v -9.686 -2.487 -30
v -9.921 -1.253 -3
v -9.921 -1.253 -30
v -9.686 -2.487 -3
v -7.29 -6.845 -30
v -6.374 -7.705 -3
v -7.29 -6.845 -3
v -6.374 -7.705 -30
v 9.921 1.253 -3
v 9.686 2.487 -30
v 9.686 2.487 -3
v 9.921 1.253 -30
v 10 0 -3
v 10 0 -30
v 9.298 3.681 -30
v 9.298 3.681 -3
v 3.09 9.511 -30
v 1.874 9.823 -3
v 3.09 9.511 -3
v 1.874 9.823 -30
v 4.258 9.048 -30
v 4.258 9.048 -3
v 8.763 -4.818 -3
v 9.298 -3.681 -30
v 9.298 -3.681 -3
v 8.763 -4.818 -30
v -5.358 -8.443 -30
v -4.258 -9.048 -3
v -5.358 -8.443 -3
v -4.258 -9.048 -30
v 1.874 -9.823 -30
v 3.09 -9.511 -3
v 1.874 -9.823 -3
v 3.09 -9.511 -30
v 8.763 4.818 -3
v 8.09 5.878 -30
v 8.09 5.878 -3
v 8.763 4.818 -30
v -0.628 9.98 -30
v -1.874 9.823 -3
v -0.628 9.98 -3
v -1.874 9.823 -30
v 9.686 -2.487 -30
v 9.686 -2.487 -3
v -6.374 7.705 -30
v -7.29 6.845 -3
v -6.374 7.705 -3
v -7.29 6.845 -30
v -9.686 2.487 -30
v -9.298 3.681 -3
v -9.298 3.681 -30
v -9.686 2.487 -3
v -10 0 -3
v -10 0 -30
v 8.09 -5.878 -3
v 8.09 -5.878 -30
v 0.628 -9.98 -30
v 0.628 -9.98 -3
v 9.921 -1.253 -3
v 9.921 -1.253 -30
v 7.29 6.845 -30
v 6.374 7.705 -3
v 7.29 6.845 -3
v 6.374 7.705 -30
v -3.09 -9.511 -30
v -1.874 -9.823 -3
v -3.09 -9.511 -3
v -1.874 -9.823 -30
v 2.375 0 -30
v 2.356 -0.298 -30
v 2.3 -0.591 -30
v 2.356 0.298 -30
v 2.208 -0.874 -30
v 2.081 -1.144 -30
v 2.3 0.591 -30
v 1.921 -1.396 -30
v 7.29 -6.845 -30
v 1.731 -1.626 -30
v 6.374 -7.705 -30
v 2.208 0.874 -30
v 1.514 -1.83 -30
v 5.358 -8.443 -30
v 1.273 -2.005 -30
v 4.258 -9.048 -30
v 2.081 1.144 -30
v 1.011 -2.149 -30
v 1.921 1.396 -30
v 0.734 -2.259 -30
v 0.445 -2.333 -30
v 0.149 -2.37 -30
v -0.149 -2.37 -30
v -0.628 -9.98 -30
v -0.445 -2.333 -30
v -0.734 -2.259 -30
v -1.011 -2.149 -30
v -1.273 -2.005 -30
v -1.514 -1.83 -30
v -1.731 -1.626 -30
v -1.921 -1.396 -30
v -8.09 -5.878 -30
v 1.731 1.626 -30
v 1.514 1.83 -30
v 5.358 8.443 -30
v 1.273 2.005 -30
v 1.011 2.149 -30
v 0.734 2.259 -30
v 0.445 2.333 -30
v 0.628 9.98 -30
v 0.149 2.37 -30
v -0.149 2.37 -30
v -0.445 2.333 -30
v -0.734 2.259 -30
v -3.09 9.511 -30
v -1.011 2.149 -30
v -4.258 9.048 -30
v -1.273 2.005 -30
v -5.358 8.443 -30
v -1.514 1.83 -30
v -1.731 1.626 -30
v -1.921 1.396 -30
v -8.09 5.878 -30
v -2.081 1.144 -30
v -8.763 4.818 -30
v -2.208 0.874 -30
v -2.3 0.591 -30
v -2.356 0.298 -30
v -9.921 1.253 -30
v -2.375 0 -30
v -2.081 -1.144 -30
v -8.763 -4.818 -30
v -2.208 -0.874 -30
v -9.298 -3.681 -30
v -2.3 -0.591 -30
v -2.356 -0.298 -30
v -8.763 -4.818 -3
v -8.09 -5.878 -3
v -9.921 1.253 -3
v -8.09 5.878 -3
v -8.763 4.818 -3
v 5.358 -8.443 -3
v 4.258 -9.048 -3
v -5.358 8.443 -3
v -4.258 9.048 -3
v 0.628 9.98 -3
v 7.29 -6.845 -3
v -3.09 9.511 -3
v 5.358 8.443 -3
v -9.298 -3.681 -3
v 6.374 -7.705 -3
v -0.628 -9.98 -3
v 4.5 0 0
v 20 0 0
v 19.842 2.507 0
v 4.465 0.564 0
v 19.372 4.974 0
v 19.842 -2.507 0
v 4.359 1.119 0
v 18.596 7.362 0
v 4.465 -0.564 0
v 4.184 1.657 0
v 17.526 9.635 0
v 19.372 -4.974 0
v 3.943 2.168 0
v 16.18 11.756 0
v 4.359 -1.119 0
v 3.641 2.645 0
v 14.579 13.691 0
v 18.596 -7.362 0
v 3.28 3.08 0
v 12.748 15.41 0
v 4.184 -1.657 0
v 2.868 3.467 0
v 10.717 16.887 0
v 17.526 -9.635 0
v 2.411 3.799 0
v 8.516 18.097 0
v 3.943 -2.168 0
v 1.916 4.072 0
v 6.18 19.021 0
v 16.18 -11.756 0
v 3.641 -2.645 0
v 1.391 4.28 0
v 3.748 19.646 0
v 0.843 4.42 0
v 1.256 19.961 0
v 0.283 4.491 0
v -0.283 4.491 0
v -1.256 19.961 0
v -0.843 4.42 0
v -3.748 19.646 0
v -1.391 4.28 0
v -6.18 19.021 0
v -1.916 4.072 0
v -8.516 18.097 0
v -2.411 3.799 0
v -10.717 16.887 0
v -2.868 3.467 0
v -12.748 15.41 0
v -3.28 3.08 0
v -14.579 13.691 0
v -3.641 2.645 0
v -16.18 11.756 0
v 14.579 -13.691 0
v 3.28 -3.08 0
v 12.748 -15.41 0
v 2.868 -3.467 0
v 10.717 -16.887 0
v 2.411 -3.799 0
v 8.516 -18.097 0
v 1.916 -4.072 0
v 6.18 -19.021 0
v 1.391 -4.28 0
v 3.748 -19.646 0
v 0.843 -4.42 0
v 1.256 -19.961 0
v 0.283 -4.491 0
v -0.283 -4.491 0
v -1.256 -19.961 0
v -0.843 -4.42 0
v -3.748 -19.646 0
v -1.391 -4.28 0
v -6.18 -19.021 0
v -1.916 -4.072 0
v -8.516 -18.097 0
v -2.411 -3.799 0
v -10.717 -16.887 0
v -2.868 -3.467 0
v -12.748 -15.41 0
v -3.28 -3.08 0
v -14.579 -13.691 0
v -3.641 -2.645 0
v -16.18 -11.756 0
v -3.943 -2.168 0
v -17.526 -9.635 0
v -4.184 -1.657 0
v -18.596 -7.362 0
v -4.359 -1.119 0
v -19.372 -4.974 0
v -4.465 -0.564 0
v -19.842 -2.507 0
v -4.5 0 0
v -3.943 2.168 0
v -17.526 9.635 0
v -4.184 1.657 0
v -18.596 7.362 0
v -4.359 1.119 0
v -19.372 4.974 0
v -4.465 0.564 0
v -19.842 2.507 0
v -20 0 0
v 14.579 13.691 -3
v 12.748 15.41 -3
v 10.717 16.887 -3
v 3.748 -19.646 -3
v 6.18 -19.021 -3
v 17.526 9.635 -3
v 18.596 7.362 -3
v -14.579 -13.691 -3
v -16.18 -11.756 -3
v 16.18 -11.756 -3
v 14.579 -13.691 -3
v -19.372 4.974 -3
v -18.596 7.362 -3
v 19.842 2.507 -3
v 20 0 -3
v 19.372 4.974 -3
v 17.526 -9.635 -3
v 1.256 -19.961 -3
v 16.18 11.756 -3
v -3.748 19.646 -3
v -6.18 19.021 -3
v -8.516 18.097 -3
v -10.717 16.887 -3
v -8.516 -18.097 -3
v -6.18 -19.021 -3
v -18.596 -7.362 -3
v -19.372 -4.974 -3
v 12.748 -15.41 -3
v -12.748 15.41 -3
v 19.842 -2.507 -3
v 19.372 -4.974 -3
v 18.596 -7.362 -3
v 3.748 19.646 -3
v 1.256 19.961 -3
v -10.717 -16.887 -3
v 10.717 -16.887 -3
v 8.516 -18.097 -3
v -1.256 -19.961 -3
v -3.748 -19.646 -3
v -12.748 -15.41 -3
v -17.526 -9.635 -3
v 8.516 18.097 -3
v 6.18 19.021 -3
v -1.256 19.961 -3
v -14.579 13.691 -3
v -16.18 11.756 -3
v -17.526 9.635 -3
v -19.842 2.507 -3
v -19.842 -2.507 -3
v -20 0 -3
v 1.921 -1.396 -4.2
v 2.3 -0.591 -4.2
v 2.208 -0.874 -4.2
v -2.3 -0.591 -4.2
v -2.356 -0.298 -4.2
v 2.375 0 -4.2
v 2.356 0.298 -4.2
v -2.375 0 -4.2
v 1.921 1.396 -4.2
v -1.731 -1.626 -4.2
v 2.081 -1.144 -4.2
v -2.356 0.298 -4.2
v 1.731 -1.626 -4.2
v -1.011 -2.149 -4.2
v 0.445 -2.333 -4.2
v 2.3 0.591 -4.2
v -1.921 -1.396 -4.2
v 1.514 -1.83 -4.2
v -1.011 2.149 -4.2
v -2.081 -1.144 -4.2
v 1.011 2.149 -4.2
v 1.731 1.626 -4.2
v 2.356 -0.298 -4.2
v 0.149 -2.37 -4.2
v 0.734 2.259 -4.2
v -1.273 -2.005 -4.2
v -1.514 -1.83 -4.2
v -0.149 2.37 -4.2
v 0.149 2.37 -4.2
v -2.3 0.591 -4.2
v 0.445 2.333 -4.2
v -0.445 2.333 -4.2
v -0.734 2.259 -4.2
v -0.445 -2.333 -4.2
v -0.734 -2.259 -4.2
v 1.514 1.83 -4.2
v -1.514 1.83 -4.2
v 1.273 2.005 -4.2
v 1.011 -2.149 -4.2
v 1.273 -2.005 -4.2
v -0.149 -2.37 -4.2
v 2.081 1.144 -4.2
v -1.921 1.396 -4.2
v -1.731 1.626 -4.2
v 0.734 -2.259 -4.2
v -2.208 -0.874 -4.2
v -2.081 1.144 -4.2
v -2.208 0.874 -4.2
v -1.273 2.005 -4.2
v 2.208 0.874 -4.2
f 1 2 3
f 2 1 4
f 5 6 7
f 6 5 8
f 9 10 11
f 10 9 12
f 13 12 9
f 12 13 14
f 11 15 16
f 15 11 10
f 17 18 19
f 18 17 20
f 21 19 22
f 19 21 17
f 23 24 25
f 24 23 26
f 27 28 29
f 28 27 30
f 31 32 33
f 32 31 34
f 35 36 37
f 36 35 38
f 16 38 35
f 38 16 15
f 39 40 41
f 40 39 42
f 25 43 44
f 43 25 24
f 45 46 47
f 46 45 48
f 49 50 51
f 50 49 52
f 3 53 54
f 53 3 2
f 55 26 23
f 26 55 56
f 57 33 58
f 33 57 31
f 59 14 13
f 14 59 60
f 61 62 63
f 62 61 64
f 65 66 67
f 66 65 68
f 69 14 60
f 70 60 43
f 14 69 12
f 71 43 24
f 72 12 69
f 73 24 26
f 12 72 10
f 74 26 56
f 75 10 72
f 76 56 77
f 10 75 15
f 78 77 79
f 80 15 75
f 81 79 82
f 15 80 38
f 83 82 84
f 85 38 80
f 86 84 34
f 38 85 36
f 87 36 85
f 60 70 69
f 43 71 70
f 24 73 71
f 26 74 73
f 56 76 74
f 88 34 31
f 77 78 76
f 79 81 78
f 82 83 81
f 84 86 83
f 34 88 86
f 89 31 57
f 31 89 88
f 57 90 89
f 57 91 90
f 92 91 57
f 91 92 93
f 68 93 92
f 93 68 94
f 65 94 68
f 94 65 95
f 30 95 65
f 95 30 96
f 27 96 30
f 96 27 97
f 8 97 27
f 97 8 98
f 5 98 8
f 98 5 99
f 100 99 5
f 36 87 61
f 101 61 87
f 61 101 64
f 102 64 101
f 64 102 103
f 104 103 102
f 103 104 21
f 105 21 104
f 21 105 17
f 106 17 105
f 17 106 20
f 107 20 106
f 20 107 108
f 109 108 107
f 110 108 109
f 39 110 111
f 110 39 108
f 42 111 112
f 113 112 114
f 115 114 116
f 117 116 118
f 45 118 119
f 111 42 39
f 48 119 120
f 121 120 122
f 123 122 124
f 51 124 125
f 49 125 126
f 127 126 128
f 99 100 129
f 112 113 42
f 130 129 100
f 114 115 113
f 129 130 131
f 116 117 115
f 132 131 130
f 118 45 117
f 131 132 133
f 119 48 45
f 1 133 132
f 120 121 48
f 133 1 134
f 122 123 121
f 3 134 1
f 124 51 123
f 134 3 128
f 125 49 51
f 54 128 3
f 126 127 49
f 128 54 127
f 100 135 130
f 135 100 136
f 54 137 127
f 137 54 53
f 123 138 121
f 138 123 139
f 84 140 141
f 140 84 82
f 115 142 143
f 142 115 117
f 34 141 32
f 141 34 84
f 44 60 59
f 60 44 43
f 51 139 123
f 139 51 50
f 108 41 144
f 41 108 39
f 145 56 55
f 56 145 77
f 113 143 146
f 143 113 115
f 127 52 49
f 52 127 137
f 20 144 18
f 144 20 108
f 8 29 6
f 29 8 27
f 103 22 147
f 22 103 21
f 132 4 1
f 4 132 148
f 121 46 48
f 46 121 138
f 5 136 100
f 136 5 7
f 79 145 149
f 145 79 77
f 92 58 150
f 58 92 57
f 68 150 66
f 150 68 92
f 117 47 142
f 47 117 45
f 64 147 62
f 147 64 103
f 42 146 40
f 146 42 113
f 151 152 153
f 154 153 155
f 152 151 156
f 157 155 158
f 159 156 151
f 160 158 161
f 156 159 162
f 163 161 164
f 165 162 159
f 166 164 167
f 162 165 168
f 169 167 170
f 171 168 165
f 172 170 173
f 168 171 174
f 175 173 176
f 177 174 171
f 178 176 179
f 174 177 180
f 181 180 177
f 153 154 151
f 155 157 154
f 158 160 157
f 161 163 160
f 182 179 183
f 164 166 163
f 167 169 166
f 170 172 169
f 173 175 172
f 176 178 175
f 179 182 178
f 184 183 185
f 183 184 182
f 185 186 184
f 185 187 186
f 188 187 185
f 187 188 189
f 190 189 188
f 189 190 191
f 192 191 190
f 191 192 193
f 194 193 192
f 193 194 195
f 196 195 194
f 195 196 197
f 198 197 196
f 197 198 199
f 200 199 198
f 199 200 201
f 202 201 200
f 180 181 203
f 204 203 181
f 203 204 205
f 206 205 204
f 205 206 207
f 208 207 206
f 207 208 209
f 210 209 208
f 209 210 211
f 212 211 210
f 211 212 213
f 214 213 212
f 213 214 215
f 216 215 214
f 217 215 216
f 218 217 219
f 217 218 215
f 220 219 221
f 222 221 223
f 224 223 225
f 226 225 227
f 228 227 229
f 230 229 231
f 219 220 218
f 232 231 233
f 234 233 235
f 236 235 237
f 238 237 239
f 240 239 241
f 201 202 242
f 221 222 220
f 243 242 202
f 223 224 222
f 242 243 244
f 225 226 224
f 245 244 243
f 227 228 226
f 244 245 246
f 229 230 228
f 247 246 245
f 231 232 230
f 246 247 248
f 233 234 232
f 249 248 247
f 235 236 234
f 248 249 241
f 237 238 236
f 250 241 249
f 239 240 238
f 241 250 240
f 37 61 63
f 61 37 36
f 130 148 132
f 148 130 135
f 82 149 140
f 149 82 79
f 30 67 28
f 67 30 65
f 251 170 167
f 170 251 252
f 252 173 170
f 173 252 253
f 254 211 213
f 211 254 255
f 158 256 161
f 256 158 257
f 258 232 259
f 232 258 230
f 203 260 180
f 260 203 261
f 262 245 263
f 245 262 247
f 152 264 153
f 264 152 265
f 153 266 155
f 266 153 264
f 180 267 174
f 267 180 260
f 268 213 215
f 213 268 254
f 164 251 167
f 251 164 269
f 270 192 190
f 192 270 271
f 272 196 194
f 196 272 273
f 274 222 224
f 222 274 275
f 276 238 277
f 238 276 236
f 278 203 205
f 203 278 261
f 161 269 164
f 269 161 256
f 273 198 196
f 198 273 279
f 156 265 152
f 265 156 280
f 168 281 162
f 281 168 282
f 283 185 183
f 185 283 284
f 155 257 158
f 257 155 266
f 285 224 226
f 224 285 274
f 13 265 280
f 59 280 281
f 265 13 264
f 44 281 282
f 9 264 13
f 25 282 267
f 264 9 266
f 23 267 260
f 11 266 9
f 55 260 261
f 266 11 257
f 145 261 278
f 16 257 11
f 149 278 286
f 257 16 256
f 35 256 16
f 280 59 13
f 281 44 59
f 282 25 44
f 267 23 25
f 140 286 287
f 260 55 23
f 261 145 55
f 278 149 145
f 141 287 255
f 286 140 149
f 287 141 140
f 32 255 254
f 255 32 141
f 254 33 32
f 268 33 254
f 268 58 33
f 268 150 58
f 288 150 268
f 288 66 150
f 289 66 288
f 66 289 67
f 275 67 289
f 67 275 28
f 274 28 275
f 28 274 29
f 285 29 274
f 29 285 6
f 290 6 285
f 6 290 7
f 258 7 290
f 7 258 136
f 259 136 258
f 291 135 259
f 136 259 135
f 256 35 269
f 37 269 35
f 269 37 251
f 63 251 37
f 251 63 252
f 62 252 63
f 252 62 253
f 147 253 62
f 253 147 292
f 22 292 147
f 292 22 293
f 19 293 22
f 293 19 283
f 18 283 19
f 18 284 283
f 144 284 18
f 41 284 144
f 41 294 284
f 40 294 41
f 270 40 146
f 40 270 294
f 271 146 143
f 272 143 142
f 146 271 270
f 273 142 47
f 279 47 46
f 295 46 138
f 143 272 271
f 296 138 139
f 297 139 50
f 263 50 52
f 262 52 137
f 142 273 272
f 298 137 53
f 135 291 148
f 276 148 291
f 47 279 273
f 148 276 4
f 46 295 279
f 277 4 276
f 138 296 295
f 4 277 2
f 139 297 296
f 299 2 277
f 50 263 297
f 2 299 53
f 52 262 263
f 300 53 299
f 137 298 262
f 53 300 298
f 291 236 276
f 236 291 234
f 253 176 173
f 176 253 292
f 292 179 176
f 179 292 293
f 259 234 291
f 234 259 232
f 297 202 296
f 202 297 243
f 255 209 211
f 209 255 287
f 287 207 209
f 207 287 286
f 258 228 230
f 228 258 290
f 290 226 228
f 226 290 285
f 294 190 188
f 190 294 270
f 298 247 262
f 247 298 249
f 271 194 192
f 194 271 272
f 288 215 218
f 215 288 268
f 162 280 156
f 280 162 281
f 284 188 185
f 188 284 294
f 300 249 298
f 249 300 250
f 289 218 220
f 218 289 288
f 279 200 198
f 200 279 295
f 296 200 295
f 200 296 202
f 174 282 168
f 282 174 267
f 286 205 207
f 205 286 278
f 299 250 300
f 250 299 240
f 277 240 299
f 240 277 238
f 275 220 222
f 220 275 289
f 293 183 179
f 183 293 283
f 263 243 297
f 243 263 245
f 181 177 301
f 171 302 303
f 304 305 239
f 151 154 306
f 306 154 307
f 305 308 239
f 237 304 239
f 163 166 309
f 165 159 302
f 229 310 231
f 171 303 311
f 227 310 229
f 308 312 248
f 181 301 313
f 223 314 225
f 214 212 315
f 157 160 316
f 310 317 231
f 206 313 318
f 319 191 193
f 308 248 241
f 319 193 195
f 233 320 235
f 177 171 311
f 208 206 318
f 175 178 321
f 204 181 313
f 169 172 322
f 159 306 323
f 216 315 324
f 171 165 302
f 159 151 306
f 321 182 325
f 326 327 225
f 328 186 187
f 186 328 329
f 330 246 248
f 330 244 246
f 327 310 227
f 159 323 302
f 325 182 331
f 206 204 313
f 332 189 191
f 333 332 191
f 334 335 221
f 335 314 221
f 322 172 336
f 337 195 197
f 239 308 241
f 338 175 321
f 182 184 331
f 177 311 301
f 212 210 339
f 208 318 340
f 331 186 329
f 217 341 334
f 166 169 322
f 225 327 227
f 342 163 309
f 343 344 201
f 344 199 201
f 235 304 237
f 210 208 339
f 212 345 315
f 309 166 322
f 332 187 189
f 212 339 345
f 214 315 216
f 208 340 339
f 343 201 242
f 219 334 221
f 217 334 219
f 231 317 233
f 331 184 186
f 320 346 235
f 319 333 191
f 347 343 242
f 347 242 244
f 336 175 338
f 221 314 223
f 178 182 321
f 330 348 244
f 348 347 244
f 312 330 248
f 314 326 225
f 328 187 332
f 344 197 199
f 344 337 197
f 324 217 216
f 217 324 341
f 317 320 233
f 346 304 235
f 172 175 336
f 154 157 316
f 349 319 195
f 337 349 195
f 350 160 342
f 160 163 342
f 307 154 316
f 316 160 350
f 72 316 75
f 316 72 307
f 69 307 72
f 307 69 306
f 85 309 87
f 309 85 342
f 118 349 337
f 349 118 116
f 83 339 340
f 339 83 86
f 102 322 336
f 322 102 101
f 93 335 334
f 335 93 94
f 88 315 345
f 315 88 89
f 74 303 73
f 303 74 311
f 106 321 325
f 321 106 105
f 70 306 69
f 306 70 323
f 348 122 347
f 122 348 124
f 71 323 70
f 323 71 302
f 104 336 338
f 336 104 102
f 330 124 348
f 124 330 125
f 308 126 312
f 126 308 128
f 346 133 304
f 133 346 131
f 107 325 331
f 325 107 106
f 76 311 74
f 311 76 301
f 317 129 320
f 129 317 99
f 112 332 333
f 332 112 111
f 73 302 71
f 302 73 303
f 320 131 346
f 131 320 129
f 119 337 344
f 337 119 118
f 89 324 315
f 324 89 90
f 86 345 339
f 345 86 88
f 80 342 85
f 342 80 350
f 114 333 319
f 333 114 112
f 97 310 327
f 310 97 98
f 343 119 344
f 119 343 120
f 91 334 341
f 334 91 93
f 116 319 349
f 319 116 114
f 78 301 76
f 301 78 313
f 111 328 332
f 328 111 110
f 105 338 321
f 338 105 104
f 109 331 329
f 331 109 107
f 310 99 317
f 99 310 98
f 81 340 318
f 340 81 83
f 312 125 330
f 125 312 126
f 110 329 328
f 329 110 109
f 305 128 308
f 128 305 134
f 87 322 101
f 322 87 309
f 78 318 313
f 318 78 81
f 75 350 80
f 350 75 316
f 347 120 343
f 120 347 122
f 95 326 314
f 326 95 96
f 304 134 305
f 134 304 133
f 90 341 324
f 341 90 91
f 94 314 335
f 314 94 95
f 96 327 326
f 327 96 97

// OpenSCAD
$fn = 50;


difference() {
	union() {
		translate(v = [0, 0, -30.0000000000]) {
			cylinder(h = 30, r = 10.0000000000);
		}
		translate(v = [0, 0, -3.0000000000]) {
			cylinder(h = 3, r = 20.0000000000);
		}
	}
	union() {
		translate(v = [0, 0, 0]) {
			rotate(a = [0, 0, 0]) {
				difference() {
					union() {
						#translate(v = [0, 0, -30.0000000000]) {
							cylinder(h = 30, r = 2.2500000000);
						}
						#translate(v = [0, 0, -4.2000000000]) {
							cylinder(h = 4.2000000000, r1 = 2.3750000000, r2 = 4.5000000000);
						}
						#translate(v = [0, 0, -30.0000000000]) {
							cylinder(h = 30, r = 2.3750000000);
						}
						#translate(v = [0, 0, -30.0000000000]) {
							cylinder(h = 30, r = 2.2500000000);
						}
					}
					union();
				}
			}
		}
	}
}
